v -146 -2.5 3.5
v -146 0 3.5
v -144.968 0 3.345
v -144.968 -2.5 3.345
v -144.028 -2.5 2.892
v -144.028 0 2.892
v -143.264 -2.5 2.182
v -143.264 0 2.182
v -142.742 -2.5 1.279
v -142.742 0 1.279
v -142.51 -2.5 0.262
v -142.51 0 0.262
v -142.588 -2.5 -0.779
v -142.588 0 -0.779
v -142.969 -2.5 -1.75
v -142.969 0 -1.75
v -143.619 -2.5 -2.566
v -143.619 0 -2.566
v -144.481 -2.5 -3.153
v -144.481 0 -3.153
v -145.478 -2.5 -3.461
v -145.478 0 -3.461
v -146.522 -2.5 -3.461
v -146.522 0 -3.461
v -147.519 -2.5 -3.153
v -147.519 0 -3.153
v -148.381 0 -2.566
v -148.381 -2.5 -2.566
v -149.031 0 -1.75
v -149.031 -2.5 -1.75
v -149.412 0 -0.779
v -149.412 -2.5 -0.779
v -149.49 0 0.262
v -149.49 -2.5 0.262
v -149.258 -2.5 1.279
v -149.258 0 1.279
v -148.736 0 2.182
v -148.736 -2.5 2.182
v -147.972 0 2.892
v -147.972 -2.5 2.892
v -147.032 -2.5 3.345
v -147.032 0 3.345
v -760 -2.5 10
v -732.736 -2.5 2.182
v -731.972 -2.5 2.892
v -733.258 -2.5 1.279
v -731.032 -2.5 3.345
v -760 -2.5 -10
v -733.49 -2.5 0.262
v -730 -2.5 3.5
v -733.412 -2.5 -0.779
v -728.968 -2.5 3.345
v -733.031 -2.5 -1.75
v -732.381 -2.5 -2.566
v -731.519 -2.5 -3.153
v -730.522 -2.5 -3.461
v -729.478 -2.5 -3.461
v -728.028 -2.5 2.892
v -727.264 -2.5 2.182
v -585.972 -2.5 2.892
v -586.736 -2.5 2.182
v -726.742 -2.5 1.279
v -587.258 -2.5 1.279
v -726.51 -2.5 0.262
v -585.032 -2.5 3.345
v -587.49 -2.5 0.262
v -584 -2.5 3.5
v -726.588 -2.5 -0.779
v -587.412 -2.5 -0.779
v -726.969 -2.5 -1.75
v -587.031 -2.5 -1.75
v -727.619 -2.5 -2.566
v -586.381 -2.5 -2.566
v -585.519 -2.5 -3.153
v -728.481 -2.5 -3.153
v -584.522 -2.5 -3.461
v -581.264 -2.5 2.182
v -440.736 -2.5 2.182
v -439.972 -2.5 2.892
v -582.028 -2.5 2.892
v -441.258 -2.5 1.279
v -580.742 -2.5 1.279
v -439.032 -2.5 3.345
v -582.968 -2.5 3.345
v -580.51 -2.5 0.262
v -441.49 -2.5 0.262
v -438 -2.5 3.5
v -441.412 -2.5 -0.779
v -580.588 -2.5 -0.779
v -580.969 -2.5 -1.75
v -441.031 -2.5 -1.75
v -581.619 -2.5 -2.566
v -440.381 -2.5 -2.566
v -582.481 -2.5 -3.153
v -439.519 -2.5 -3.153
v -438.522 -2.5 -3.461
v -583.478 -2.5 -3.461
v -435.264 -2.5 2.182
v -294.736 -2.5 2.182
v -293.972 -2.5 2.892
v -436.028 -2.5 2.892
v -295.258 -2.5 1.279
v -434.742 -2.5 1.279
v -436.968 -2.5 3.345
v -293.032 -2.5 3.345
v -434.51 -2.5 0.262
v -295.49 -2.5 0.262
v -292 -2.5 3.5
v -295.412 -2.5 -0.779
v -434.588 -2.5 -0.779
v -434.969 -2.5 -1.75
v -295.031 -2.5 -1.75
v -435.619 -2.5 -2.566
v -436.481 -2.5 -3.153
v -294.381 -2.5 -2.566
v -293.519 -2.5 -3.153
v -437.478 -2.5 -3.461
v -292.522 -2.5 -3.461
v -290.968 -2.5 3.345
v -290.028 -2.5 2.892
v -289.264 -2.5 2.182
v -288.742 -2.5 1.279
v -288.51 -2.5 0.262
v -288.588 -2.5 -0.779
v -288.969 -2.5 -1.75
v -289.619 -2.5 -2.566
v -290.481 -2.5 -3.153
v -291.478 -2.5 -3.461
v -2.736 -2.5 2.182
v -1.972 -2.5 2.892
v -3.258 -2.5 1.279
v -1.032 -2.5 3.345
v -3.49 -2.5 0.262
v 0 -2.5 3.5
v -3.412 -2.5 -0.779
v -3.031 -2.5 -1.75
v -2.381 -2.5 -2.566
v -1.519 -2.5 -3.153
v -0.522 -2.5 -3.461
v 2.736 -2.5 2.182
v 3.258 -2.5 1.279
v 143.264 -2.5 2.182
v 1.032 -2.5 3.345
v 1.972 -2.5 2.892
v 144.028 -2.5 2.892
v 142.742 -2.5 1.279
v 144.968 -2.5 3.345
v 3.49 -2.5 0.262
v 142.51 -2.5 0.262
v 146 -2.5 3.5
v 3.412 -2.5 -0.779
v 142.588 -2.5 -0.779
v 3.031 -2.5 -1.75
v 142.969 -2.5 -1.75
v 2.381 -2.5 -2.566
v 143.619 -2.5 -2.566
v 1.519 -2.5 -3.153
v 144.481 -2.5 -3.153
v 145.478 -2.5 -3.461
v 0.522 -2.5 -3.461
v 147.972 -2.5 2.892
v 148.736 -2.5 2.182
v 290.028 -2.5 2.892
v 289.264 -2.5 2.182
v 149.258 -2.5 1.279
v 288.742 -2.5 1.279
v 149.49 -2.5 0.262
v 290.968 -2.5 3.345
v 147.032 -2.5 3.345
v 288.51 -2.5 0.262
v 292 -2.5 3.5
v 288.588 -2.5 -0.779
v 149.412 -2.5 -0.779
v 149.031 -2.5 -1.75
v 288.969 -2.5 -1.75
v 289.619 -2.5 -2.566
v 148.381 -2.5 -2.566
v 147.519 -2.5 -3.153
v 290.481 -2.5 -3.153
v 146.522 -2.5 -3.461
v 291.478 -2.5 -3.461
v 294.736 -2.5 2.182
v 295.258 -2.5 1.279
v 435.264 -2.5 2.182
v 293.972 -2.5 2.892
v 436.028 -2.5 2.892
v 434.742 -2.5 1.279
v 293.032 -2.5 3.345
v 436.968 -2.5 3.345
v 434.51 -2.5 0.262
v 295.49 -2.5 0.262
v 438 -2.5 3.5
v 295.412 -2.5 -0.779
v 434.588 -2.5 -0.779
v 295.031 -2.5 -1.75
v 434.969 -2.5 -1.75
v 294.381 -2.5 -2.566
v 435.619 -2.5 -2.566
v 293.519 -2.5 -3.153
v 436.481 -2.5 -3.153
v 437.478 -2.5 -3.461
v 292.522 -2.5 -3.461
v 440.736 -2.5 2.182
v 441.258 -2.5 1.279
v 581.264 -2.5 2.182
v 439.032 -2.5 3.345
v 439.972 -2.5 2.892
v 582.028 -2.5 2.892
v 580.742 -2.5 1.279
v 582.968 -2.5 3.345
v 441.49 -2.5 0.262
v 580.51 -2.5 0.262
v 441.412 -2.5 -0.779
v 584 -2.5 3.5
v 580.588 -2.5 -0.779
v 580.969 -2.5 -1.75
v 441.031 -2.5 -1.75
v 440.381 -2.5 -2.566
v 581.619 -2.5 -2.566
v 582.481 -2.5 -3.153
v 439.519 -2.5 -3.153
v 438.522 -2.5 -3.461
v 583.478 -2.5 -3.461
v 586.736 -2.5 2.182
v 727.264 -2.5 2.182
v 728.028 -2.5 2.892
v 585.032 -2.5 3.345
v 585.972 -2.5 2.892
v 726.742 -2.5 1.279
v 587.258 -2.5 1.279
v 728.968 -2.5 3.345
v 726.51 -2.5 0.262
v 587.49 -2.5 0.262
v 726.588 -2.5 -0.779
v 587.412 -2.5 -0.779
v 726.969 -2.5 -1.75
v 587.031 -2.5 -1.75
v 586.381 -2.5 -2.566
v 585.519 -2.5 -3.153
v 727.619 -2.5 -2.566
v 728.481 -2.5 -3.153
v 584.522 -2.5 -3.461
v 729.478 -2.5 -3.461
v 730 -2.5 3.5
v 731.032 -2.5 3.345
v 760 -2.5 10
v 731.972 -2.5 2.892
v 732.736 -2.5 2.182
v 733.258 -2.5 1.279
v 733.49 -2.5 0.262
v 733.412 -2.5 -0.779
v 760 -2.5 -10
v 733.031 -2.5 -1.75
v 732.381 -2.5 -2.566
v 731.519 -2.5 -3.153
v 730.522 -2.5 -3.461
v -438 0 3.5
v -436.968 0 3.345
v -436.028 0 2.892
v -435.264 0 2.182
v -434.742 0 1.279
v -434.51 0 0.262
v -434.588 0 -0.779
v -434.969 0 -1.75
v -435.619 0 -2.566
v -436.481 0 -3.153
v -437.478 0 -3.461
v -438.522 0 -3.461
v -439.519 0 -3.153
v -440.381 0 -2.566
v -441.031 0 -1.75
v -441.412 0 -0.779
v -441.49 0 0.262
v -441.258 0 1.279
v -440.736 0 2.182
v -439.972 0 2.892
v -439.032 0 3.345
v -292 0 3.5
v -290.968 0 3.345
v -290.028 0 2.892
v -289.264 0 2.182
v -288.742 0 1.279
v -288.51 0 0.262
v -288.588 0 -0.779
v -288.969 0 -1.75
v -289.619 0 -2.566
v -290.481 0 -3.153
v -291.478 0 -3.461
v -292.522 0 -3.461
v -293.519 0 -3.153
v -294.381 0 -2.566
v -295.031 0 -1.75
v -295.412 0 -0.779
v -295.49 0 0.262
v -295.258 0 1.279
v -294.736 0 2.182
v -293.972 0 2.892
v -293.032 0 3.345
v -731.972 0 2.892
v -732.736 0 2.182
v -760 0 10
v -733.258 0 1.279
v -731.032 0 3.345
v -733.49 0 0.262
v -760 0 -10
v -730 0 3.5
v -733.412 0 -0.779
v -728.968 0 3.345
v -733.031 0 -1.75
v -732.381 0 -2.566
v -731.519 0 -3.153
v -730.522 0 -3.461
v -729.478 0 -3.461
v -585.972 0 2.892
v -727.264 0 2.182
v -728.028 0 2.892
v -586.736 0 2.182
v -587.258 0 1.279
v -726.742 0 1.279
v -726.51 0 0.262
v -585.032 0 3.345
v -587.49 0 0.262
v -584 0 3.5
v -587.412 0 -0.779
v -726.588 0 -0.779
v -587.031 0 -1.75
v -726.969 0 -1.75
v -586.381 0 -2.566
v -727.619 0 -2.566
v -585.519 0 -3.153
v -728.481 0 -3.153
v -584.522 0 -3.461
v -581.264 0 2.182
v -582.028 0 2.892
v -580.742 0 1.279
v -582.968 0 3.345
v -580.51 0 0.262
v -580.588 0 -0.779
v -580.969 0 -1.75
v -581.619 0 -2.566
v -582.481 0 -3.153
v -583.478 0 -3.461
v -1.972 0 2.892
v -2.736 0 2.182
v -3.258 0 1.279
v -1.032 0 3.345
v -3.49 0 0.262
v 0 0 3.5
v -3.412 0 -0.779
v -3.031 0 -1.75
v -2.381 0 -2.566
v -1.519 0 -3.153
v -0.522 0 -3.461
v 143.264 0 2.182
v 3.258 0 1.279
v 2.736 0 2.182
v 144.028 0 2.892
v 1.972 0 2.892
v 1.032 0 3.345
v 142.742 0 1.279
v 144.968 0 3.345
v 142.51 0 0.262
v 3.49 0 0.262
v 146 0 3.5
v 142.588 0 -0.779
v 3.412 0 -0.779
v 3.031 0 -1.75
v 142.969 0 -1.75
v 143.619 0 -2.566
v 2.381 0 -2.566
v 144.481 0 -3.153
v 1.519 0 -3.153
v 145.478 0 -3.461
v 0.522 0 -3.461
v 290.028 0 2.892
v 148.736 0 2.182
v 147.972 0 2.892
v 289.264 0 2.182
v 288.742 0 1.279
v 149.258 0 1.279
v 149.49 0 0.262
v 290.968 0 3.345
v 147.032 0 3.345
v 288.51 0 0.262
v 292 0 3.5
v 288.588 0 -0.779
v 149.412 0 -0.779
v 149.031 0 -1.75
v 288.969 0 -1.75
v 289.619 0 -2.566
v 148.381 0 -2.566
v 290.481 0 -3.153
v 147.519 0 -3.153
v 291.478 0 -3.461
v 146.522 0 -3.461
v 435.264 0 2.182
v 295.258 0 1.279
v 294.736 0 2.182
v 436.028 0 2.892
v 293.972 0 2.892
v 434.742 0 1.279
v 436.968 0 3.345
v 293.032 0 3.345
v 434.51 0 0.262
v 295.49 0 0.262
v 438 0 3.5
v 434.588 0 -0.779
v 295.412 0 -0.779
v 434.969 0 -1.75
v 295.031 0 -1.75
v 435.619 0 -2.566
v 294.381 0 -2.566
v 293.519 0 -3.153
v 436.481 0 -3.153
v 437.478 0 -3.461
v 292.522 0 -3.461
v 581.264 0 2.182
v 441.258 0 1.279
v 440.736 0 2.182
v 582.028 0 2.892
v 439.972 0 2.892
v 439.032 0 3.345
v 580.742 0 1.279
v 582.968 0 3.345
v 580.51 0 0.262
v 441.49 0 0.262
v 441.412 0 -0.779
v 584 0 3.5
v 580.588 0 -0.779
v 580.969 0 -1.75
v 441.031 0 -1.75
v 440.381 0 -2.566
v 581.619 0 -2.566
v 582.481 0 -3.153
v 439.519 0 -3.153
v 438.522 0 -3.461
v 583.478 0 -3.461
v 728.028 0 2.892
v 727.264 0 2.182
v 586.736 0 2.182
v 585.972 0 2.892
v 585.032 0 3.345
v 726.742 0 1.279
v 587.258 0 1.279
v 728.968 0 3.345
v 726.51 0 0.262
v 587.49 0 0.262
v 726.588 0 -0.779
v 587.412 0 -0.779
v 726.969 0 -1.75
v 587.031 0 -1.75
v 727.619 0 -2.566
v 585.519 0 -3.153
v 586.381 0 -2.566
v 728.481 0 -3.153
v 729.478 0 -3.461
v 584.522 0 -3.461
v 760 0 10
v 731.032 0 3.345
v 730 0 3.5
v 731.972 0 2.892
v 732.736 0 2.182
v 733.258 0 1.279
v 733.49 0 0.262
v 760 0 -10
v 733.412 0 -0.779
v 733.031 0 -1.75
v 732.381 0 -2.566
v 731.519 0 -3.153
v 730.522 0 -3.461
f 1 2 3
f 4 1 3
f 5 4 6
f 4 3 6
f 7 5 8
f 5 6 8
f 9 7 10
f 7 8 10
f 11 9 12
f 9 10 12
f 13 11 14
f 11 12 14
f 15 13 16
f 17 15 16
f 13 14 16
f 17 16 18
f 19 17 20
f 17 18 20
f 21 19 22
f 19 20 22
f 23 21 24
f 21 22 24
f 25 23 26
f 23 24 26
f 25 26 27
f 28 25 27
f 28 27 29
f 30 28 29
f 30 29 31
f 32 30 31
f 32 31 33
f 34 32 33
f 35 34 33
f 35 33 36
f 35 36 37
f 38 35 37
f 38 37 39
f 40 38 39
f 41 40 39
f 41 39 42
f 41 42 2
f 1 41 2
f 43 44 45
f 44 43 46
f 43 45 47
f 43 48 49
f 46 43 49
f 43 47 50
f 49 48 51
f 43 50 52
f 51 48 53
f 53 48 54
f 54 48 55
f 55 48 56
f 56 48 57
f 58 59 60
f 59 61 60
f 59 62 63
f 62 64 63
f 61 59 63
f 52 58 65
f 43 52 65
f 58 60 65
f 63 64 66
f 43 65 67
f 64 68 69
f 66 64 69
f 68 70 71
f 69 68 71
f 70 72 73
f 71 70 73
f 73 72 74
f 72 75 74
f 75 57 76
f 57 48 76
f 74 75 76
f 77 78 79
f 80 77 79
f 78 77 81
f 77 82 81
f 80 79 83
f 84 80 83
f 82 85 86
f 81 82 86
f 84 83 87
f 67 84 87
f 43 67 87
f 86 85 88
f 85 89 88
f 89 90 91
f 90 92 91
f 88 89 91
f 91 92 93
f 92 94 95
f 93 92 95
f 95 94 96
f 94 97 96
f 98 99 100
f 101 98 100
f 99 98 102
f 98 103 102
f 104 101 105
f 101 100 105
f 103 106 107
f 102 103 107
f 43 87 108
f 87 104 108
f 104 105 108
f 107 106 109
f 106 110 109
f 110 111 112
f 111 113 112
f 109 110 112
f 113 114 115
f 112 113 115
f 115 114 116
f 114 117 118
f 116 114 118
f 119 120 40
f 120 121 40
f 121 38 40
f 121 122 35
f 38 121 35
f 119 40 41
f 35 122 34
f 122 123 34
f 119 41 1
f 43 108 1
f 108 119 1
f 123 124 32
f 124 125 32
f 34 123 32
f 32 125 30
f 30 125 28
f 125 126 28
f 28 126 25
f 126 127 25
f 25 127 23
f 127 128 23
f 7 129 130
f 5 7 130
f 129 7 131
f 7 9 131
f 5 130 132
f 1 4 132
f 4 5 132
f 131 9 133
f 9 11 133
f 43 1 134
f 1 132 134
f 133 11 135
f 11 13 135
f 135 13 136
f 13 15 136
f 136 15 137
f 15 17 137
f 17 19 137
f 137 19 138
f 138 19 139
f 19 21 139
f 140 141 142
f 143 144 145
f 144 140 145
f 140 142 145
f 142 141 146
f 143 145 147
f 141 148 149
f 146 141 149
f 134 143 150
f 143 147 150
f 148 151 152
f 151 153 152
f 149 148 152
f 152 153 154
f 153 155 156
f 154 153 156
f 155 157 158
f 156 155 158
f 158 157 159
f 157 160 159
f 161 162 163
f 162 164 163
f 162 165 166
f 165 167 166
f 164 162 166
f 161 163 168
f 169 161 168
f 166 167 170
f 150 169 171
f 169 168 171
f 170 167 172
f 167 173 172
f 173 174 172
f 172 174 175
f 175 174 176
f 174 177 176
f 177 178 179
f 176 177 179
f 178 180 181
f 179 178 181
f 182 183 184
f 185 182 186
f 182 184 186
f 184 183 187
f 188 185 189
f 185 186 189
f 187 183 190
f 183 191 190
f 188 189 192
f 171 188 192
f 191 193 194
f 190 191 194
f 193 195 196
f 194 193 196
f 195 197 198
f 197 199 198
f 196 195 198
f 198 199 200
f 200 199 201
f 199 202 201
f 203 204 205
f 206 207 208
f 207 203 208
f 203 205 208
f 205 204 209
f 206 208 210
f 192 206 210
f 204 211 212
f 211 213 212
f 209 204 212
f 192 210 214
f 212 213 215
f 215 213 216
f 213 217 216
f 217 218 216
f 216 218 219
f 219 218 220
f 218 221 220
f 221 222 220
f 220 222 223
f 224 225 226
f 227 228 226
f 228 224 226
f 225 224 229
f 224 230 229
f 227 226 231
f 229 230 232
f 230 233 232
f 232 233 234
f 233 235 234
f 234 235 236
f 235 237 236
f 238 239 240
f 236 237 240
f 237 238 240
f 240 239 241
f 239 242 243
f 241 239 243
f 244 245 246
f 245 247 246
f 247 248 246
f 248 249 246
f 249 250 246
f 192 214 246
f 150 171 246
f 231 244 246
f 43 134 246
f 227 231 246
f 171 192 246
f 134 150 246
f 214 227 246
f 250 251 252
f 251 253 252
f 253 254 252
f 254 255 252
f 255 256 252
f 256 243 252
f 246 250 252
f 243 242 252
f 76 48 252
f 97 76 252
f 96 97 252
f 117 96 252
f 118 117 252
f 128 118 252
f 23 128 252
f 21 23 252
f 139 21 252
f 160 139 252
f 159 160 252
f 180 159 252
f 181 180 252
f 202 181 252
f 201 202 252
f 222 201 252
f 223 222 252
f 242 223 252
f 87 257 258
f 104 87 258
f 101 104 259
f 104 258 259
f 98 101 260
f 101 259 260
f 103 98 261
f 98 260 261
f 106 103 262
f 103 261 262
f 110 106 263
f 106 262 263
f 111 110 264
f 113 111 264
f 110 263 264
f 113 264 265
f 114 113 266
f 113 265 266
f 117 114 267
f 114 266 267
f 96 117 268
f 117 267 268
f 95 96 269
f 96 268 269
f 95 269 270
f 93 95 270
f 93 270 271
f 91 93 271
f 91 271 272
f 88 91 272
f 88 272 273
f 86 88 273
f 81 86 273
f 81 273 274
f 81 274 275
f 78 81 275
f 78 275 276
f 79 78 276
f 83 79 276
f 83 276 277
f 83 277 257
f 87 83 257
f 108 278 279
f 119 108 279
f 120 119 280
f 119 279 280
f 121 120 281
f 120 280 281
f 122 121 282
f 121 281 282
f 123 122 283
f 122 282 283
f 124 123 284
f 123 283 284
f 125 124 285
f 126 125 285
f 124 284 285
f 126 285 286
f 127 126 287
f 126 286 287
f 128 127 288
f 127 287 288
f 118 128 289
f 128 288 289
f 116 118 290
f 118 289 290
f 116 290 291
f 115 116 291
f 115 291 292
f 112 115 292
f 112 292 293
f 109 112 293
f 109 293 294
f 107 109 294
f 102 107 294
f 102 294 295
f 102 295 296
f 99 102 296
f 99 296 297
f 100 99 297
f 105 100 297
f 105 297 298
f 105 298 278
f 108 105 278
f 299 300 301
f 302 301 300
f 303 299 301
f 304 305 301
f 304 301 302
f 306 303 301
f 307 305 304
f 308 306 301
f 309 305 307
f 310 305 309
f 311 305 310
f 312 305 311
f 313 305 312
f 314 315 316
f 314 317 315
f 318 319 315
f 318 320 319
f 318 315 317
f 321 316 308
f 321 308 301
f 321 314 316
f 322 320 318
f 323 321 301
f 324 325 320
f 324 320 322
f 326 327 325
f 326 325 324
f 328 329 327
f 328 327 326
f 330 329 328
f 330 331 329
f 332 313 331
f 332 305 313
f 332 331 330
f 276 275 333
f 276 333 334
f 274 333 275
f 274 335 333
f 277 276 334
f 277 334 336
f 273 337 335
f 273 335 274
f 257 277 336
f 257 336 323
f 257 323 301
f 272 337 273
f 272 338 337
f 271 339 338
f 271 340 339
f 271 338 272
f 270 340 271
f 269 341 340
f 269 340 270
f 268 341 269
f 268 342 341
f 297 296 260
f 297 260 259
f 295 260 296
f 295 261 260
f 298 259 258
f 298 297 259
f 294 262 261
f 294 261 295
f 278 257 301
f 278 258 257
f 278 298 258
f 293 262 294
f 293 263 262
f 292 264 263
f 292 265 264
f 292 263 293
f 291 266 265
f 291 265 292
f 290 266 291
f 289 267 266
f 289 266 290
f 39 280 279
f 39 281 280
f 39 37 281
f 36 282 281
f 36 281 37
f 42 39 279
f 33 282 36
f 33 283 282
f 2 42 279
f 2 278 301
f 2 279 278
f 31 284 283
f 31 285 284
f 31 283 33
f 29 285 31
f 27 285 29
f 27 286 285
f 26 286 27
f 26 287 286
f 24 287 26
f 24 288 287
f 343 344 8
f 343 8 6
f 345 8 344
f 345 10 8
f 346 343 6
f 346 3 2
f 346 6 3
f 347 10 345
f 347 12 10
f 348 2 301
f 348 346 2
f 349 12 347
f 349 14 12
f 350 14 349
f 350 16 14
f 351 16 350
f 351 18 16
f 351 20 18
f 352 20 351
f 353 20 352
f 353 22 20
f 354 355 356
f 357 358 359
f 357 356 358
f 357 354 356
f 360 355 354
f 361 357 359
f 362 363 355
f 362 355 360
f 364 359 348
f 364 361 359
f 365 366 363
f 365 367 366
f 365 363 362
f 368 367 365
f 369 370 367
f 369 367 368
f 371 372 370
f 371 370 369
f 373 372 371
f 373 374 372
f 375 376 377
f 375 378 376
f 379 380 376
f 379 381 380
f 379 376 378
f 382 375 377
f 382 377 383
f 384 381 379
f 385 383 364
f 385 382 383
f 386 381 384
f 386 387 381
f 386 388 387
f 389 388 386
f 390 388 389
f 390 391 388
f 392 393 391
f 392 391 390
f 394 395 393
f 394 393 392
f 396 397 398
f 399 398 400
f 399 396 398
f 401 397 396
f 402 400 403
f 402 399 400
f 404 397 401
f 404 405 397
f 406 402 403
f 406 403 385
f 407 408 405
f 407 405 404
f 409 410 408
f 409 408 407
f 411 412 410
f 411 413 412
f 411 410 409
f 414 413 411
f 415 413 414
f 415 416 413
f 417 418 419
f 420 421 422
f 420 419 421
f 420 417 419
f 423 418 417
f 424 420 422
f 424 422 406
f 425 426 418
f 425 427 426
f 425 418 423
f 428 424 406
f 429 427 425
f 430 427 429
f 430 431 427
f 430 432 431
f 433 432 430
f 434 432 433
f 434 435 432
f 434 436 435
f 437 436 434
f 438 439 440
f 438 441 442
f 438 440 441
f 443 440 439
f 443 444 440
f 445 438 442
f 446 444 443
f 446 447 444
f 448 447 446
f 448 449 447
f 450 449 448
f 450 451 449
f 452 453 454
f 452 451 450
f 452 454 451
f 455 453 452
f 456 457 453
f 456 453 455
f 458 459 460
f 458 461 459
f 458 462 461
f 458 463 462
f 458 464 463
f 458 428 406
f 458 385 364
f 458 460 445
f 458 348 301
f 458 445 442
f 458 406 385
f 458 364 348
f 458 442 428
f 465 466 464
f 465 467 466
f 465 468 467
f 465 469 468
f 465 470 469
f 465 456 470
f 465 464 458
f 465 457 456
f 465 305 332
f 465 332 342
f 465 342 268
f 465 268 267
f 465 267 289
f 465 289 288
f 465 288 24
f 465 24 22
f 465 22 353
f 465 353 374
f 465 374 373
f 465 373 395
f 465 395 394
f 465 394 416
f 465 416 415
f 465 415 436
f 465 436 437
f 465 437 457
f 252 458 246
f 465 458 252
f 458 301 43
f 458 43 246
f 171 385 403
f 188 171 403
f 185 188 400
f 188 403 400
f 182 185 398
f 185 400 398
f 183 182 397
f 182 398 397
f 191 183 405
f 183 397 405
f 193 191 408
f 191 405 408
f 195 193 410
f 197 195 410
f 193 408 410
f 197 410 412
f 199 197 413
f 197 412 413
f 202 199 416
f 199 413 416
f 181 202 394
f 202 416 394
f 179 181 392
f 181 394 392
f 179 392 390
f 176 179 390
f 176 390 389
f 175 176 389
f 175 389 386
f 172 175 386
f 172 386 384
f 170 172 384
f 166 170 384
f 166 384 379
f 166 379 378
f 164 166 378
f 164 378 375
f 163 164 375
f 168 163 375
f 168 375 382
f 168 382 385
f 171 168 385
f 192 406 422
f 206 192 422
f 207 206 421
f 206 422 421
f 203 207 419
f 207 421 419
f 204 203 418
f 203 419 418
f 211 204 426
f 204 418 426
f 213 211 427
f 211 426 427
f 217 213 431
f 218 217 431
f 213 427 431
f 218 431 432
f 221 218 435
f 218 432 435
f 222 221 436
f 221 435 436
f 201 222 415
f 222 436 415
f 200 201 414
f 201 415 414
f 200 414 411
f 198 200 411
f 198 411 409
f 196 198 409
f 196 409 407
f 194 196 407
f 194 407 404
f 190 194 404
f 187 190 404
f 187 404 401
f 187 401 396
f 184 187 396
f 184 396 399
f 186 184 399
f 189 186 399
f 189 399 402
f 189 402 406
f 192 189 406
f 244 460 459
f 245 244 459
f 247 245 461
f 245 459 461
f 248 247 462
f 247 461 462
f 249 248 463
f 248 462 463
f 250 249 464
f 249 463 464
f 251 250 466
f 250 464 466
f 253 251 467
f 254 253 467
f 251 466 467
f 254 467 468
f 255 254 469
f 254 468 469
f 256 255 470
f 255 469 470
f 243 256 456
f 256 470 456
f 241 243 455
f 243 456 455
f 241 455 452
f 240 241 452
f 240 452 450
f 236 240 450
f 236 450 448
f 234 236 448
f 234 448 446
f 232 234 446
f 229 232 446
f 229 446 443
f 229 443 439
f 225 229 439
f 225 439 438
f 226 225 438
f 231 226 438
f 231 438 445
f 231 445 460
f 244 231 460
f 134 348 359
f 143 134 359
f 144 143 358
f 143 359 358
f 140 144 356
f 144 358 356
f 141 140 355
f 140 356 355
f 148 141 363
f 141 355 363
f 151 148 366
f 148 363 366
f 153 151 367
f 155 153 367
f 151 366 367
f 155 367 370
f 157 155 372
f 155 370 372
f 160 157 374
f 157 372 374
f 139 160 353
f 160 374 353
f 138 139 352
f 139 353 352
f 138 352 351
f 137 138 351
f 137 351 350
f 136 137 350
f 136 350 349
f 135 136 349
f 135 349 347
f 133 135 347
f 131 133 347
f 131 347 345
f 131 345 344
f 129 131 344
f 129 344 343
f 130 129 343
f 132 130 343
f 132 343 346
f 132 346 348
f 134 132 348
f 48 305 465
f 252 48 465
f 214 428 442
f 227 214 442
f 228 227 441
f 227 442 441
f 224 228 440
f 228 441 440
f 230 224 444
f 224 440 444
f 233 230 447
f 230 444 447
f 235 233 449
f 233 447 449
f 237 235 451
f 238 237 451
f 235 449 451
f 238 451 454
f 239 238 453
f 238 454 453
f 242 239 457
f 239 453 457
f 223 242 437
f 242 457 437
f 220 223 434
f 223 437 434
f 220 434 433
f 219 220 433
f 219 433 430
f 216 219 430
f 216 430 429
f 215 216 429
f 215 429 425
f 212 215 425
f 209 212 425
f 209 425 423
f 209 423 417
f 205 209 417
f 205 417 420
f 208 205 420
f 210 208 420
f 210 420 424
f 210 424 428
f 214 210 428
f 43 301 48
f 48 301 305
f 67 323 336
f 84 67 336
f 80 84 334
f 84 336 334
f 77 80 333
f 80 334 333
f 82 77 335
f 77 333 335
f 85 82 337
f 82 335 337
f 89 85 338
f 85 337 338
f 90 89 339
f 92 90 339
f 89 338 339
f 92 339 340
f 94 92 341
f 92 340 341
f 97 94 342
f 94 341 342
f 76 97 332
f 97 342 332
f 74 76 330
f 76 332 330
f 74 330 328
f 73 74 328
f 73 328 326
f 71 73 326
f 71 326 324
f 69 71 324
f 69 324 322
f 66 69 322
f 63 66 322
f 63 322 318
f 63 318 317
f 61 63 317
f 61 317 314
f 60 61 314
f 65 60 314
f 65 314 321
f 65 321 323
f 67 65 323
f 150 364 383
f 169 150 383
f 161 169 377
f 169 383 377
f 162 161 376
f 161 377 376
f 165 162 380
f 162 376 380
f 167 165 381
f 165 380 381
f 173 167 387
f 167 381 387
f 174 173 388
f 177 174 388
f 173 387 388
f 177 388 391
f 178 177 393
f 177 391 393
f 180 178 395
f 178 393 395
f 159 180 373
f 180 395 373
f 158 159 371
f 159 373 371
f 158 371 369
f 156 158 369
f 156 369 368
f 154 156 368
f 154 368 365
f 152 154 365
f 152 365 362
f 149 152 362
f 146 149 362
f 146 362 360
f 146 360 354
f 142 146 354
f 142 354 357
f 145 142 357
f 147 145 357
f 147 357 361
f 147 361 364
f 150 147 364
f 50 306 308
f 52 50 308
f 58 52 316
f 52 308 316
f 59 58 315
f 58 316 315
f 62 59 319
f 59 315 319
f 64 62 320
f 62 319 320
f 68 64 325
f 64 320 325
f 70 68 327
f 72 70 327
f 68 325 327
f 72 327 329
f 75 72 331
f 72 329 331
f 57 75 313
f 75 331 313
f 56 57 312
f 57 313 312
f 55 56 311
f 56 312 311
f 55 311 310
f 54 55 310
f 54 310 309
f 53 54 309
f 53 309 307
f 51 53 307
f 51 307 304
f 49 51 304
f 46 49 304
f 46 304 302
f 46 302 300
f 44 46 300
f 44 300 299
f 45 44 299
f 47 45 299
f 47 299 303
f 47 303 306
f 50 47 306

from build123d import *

# Parameters (mm, degrees)
SKETCH1_W           = 1520
SKETCH1_H           = 20
BASE_FLANGE1_DEPTH  = 2.5
SKETCH6_R           = 3.5
CUT_EXTRUDE1_DEPTH  = 10
LPATTERN1_COUNT     = 6
LPATTERN1_PITCH     = 146
LPATTERN1_COL_COUNT = 6
LPATTERN1_COL_PITCH = 146


# Sheet-metal steps are written as plain solids
with BuildPart() as part:
    # Sketch1 → Base-Flange1 (new body)
    with BuildSketch(Plane(origin=(0, 0, 0), x_dir=(1, 0, 0), z_dir=(0, 1, 0))):
        Rectangle(SKETCH1_W, SKETCH1_H)
    extrude(amount=-BASE_FLANGE1_DEPTH)

    # Sketch6 → Cut-Extrude1 (cut)
    with BuildSketch(Plane(origin=(0, 0, 0), x_dir=(1, 0, 0), z_dir=(0, 1, 0))):
        with Locations(Location((0, 0, 0), (0, 0, 270))):
            Circle(SKETCH6_R)
    cut_extrude1 = extrude(amount=-CUT_EXTRUDE1_DEPTH, mode=Mode.SUBTRACT)

    # LPattern1: Cut-Extrude1 ×6
    with Locations(*[(-i * LPATTERN1_PITCH, 0, 0) for i in range(1, LPATTERN1_COUNT)]):
        add(cut_extrude1, mode=Mode.SUBTRACT)

    # LPattern1 col: Cut-Extrude1 ×6
    with Locations(*[(i * LPATTERN1_COL_PITCH, 0, 0) for i in range(1, LPATTERN1_COL_COUNT)]):
        add(cut_extrude1, mode=Mode.SUBTRACT)


solid = part.part
